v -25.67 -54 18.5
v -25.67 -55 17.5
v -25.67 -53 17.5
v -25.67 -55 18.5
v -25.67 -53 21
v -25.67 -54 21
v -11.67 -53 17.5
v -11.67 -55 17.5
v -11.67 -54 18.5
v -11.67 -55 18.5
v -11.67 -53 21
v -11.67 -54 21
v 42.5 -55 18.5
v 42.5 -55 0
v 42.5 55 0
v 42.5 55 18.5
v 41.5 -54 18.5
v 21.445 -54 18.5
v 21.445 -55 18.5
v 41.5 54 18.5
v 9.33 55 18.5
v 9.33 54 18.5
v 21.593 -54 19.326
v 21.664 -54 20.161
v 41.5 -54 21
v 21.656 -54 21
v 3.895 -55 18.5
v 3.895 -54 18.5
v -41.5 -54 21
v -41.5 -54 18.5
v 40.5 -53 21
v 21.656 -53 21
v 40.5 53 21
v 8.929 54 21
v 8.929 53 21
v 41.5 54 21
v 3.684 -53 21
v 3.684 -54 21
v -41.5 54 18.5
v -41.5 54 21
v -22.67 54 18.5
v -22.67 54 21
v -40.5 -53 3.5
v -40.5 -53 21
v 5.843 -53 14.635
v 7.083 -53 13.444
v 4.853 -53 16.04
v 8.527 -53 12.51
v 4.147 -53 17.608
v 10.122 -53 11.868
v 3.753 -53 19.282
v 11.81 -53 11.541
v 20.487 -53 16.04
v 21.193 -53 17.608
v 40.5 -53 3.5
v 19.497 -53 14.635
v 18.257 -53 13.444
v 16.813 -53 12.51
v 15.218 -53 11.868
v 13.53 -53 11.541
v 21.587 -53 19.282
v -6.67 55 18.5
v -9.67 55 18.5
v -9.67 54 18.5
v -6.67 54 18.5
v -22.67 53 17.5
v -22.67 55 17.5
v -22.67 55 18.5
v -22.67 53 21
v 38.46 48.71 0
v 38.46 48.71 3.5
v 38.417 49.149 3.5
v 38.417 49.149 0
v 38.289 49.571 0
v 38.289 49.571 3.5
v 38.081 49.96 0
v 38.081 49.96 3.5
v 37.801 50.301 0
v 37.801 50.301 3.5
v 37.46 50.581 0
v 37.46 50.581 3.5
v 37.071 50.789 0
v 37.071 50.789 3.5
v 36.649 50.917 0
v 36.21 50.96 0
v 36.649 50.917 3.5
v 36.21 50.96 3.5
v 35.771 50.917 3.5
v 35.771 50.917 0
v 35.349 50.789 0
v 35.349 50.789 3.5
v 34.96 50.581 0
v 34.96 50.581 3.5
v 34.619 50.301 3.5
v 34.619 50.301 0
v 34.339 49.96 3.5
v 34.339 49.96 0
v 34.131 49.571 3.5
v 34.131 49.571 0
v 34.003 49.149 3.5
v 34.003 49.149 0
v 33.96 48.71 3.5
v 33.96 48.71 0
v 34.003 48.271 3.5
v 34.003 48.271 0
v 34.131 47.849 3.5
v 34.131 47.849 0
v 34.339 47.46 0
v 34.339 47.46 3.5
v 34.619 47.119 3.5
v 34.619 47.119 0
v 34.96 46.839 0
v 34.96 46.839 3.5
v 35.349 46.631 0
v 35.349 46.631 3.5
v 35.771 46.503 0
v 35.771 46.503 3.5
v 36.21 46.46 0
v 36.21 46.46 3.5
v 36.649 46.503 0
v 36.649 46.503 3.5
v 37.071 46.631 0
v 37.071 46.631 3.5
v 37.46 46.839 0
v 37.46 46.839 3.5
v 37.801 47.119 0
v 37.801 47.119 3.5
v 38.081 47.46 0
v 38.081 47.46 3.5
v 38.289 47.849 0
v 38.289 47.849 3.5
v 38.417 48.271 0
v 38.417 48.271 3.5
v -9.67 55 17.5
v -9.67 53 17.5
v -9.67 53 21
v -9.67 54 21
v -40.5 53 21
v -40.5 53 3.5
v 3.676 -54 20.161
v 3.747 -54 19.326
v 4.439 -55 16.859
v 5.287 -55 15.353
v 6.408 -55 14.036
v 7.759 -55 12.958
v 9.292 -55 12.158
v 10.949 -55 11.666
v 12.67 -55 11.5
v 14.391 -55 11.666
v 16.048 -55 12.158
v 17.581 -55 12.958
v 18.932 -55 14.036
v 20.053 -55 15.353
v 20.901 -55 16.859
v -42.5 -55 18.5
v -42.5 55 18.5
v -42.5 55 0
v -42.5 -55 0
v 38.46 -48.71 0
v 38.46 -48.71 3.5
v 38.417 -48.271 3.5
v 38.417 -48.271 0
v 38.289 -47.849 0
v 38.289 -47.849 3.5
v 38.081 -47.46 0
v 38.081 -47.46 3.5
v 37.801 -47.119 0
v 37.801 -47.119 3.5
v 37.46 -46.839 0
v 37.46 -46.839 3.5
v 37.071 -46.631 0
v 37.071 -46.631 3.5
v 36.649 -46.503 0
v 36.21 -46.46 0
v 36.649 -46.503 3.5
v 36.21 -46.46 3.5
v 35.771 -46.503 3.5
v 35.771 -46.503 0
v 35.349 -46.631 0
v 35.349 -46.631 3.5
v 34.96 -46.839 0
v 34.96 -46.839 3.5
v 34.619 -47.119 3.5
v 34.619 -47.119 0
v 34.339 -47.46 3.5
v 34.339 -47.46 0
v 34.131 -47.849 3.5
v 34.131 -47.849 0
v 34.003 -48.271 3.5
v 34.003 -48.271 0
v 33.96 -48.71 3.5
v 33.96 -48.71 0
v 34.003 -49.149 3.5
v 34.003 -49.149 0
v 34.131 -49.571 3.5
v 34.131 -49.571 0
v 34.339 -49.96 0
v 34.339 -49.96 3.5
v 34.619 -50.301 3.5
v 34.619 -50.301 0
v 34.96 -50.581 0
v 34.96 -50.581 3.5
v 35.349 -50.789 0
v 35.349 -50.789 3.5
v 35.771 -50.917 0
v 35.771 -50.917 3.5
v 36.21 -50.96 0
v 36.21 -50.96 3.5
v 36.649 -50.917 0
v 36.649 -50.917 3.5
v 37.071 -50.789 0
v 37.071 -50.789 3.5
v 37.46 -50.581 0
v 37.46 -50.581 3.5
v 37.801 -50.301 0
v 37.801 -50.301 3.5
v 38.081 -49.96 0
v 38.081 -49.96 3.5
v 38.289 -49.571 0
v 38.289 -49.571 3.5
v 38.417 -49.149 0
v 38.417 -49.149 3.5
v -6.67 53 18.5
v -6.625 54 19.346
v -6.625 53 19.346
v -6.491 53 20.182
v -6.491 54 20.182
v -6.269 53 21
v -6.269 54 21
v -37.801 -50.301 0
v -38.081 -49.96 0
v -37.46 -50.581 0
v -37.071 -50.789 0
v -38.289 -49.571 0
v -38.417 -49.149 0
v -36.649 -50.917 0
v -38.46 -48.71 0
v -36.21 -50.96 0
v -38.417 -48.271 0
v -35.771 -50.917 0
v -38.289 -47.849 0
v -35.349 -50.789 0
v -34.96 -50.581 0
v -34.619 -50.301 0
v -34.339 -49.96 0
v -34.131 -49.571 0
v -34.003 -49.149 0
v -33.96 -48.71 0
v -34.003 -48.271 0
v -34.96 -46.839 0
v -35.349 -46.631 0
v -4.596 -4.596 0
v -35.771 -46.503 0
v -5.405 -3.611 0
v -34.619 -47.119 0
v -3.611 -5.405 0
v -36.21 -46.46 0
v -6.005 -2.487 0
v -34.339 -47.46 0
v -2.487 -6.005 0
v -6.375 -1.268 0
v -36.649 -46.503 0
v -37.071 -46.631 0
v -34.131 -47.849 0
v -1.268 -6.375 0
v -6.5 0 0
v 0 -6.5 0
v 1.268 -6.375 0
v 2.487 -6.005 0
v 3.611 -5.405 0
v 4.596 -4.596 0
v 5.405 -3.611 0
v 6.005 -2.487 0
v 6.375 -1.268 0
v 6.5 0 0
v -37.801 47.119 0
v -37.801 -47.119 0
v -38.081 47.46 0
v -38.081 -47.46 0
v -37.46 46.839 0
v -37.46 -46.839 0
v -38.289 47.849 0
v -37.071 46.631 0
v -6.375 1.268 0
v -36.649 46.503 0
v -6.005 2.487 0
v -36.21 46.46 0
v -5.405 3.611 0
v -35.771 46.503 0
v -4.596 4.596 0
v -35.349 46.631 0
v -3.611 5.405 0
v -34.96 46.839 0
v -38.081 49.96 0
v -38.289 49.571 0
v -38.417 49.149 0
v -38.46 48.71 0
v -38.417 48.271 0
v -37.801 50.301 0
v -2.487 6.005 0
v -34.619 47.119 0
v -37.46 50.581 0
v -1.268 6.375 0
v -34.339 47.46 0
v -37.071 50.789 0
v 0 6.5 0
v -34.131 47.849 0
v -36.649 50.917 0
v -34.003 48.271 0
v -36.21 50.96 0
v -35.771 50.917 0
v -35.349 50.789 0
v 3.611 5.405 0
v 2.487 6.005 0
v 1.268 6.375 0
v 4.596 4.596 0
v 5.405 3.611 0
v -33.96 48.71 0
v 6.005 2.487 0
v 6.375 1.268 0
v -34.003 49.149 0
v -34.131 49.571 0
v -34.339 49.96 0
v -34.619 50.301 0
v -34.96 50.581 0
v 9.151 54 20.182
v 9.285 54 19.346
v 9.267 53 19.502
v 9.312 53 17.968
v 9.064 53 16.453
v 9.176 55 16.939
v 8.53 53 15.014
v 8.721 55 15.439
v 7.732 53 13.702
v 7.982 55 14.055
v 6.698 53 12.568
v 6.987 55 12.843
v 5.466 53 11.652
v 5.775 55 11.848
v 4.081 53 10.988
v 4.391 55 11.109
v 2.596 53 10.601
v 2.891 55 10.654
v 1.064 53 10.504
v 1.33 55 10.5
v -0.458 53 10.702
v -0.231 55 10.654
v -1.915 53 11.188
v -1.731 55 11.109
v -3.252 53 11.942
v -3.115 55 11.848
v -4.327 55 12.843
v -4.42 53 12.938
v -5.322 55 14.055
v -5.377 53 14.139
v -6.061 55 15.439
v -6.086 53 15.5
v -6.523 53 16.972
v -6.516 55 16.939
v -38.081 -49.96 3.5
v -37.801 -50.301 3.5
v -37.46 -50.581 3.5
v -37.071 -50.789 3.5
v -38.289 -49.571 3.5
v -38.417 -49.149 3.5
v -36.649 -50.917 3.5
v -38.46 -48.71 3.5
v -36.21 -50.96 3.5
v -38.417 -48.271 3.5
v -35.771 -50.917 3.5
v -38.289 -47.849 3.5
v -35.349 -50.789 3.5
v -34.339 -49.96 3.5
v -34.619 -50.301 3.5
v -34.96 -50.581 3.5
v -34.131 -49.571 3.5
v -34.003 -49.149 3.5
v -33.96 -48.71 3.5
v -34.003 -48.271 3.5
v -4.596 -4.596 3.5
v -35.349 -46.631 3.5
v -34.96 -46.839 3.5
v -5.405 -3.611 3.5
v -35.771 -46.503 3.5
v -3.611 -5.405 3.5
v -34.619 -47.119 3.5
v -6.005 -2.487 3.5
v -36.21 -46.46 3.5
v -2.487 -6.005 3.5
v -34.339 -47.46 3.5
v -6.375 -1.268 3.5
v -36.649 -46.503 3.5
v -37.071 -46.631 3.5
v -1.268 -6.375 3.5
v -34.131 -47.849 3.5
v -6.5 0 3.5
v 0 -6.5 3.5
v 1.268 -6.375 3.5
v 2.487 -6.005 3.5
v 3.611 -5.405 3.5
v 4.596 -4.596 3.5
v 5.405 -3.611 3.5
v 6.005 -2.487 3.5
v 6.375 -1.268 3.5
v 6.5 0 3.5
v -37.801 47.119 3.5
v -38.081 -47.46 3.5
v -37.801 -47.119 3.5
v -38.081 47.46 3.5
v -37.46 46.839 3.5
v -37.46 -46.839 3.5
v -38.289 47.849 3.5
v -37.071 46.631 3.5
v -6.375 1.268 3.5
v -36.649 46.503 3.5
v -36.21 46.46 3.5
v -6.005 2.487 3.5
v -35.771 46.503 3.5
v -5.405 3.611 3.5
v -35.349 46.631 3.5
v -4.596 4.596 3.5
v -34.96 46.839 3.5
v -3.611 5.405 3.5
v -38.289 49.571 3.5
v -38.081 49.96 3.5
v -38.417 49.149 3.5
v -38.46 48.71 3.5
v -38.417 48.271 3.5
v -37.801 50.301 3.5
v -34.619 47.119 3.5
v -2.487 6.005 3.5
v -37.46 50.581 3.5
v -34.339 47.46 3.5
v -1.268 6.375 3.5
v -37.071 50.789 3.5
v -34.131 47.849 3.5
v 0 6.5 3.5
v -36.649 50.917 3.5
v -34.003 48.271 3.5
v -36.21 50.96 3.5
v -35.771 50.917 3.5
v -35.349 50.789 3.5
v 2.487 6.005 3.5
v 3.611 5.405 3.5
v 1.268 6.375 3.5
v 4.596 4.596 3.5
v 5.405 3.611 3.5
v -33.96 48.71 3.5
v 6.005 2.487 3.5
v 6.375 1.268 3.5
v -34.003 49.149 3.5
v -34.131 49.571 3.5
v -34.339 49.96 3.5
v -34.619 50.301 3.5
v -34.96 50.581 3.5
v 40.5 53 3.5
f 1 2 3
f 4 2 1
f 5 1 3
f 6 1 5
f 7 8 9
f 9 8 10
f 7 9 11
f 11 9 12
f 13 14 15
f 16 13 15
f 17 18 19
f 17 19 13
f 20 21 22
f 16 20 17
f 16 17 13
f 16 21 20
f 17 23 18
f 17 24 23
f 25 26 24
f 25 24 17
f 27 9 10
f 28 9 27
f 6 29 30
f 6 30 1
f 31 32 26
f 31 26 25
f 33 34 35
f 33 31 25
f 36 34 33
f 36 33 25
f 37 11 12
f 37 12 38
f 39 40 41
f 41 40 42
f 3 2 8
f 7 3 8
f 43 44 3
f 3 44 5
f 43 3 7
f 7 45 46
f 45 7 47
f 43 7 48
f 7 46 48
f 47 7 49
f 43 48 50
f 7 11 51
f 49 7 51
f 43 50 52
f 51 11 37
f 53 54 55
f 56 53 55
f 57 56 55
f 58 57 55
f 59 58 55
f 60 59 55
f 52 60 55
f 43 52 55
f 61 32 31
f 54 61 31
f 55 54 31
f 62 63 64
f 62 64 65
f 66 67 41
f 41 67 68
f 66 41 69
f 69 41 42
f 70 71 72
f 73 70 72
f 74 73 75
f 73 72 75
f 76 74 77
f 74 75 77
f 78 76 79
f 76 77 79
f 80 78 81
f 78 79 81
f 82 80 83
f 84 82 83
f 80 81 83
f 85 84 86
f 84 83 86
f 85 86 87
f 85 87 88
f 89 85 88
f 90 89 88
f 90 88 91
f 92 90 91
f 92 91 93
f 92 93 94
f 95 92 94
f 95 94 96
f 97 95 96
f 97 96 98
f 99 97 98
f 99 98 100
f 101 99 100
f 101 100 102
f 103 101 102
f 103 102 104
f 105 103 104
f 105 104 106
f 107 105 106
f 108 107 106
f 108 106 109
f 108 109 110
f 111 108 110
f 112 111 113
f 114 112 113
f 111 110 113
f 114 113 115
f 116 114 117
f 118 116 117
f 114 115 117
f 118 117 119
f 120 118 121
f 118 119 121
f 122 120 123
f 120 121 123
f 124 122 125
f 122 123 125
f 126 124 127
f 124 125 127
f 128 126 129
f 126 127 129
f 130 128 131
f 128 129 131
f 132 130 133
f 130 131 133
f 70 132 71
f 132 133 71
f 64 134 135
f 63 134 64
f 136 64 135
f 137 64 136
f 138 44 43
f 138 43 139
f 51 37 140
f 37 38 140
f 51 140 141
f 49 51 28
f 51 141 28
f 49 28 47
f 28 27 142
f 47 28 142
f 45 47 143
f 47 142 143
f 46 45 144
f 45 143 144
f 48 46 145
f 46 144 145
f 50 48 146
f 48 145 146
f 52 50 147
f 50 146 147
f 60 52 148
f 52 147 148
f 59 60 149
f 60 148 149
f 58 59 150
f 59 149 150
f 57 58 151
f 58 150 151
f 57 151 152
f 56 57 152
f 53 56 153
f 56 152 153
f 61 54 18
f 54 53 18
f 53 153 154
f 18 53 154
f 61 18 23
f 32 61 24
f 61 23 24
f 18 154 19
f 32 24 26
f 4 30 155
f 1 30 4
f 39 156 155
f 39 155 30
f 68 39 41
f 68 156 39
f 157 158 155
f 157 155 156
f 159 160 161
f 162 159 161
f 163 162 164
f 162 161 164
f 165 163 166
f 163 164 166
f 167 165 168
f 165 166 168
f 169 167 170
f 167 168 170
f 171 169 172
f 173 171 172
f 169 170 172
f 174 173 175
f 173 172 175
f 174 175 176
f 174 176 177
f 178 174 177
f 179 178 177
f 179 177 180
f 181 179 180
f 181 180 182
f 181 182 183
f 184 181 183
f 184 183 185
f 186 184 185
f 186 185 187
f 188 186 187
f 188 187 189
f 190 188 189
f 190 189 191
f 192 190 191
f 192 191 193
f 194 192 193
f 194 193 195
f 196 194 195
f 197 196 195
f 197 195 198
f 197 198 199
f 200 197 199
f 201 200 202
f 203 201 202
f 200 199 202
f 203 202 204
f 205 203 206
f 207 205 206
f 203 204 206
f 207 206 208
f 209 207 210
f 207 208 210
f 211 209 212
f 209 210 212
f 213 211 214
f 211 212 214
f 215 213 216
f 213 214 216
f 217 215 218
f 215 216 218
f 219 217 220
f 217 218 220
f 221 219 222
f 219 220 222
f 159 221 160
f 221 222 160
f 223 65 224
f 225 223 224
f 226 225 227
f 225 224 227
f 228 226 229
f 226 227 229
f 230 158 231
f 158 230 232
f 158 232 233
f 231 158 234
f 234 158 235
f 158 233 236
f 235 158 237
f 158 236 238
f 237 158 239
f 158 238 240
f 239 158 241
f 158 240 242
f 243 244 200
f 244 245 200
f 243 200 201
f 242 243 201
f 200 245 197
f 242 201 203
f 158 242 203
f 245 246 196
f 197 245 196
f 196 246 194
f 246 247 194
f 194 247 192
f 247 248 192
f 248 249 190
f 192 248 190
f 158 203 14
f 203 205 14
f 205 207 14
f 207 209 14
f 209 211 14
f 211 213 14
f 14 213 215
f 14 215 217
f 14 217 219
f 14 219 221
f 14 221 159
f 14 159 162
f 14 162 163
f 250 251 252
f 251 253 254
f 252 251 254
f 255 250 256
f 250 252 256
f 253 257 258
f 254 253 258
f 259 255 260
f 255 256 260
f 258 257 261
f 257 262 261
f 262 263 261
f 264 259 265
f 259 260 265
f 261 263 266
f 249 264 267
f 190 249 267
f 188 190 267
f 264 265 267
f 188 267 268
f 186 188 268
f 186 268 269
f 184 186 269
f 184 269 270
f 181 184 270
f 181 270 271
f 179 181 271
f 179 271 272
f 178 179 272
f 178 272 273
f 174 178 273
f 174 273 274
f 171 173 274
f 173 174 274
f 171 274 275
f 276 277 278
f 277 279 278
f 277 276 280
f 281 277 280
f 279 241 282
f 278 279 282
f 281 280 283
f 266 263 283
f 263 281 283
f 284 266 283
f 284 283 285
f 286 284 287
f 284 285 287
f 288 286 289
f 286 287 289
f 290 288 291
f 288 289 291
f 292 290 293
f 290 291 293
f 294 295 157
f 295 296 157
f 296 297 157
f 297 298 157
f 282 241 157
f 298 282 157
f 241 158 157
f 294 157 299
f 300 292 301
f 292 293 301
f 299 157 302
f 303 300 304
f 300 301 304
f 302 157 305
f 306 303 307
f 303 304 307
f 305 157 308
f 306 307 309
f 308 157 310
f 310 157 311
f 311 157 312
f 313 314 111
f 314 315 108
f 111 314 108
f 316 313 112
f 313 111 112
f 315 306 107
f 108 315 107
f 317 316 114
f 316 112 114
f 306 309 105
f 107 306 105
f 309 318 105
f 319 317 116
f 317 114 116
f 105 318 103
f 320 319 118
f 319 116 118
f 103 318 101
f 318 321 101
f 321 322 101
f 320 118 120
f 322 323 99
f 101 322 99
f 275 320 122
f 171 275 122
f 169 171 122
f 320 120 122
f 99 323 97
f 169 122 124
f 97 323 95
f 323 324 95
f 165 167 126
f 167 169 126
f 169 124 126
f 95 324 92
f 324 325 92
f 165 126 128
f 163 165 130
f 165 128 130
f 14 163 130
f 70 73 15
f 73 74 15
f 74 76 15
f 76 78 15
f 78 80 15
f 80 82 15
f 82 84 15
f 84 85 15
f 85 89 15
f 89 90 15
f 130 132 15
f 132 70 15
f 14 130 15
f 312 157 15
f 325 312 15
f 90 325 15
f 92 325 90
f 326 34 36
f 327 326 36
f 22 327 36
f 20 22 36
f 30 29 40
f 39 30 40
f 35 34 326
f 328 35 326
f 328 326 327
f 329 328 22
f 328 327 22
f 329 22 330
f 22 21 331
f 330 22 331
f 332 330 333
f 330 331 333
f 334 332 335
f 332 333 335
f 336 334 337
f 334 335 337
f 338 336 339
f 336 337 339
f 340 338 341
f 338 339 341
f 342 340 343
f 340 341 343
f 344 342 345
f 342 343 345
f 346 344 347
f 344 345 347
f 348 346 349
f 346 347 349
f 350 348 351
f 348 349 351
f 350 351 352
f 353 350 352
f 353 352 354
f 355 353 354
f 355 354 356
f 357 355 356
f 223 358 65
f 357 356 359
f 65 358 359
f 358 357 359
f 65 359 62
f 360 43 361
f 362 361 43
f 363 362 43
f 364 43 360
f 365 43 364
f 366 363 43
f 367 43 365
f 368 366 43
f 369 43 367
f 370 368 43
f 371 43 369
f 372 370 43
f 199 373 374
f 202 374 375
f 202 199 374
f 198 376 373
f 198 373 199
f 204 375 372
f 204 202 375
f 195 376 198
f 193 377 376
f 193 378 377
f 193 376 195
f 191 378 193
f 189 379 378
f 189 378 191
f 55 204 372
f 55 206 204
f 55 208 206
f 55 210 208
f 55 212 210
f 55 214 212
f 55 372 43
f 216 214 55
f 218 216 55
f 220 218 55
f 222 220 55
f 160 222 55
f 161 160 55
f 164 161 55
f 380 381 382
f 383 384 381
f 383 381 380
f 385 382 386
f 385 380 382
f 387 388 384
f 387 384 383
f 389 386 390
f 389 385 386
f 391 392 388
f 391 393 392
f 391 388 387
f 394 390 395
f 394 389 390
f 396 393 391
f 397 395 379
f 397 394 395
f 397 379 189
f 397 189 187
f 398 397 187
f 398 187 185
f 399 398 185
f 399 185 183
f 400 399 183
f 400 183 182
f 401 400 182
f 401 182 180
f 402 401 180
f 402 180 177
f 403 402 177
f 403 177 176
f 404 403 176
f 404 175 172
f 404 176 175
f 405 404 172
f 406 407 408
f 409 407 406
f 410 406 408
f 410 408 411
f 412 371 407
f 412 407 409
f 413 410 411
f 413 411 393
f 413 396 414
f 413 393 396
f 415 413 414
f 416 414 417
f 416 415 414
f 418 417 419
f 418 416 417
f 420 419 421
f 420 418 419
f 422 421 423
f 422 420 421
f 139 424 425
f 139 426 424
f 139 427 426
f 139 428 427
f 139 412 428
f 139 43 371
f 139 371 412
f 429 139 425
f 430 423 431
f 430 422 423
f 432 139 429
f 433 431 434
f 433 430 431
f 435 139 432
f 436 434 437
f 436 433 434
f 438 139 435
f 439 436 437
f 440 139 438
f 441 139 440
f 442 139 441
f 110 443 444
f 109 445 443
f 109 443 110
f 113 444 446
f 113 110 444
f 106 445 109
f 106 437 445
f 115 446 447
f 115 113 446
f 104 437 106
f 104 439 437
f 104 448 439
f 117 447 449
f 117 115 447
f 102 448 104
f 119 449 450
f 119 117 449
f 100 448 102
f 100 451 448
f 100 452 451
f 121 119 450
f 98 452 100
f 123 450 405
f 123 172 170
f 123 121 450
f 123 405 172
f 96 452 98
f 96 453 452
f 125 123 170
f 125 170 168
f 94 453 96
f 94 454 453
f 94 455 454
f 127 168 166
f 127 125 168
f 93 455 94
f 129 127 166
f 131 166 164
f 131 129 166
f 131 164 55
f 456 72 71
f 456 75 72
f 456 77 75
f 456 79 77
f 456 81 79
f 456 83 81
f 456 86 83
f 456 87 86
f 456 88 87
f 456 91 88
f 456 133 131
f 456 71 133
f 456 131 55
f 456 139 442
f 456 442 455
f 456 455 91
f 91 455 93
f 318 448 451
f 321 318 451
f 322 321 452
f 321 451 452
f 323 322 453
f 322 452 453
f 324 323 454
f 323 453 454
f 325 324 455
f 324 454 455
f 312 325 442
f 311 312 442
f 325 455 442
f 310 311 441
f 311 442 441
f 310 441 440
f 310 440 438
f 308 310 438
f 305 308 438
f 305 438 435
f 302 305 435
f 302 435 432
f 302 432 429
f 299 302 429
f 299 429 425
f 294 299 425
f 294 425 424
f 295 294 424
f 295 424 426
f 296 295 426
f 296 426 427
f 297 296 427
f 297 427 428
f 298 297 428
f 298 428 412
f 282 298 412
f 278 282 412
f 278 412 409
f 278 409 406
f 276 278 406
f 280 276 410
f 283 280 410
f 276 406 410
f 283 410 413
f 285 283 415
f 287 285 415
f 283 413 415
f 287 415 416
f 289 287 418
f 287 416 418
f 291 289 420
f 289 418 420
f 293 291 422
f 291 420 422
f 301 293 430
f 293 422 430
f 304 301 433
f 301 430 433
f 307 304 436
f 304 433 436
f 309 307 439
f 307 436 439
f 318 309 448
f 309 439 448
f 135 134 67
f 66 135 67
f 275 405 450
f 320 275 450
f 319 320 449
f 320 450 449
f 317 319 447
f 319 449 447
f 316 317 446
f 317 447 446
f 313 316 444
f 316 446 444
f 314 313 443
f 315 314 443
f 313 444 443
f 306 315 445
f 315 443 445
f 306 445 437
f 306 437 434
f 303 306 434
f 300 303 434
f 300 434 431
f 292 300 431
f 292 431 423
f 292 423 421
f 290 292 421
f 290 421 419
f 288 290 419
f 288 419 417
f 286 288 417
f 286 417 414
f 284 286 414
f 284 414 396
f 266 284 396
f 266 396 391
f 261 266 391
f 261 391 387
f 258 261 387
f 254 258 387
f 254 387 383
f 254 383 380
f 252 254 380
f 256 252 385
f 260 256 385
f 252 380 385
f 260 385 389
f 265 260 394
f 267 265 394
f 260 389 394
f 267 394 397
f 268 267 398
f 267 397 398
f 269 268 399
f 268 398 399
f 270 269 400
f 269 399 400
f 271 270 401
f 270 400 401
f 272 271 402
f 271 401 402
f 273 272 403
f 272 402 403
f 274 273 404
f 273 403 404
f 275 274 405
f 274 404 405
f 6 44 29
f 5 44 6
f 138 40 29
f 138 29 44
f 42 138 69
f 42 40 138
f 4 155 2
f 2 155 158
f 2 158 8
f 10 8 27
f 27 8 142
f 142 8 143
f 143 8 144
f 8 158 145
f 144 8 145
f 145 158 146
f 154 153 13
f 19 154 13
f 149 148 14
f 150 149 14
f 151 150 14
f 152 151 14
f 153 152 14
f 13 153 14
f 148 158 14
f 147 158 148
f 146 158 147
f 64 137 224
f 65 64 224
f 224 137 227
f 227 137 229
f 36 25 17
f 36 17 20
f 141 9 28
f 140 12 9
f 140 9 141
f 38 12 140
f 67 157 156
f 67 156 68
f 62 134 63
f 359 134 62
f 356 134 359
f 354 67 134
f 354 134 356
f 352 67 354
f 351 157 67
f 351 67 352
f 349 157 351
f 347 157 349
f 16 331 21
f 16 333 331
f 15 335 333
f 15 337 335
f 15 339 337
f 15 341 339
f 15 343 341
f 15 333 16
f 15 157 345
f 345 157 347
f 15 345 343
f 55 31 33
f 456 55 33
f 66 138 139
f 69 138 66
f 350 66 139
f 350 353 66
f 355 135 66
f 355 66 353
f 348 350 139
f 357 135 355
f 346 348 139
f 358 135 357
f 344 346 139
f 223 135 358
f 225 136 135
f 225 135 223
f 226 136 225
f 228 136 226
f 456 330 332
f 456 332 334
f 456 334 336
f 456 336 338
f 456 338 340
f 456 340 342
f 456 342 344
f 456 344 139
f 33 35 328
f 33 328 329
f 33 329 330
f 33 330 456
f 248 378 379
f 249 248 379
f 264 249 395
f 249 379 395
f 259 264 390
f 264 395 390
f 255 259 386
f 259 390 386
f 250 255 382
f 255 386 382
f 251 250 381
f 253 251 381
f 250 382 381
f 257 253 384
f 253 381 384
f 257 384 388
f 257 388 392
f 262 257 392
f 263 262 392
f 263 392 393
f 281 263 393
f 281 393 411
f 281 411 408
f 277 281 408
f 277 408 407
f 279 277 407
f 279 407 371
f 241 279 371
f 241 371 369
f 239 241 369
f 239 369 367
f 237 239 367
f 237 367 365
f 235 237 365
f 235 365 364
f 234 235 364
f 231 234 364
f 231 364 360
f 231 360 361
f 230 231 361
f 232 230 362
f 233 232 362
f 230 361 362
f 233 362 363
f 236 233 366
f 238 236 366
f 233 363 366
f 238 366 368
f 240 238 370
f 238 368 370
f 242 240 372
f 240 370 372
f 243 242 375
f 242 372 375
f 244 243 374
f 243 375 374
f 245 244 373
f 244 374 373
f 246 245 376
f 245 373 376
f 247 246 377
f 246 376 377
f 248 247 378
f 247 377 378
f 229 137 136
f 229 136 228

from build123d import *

# Parameters (mm, degrees)
SKETCH_W        = 85
SKETCH_H        = 110
PAD_DEPTH       = 3.5
SKETCH001_W     = 85
SKETCH001_H     = 110
PAD001_DEPTH    = 17.5
SKETCH002_W     = 81
SKETCH002_H     = 106
POCKET_DEPTH    = 17.5
SKETCH003_W     = 85
SKETCH003_H     = 110
SKETCH003_W_2   = 83
SKETCH003_H_2   = 108
POCKET001_DEPTH = 2.5
SKETCH004_R     = 9
SKETCH004_W     = 14
SKETCH004_H     = 12
POCKET002_DEPTH = 5
SKETCH005_R     = 8
SKETCH005_W     = 13
SKETCH005_H     = 12
POCKET003_DEPTH = 5
SKETCH006_R     = 2.25
POCKET004_DEPTH = 5
SKETCH007_R     = 6.5
POCKET005_DEPTH = 5


with BuildPart() as part:
    # Sketch → Pad (new body)
    with BuildSketch(Plane.XY):
        Rectangle(SKETCH_W, SKETCH_H)
    extrude(amount=PAD_DEPTH)

    # Sketch001 (on Face6 of Pad) → Pad001 (join)
    with BuildSketch(Plane.XY.offset(3.5)):
        Rectangle(SKETCH001_W, SKETCH001_H)
    extrude(amount=PAD001_DEPTH)

    # Sketch002 (on Face9 of Pad001) → Pocket (cut)
    with BuildSketch(Plane.XY.offset(21)):
        Rectangle(SKETCH002_W, SKETCH002_H)
    extrude(amount=-POCKET_DEPTH, mode=Mode.SUBTRACT)

    # Sketch003 (on Face9 of Pocket) → Pocket001 (cut)
    with BuildSketch(Plane.XY.offset(21)):
        Rectangle(SKETCH003_W, SKETCH003_H)
        Rectangle(SKETCH003_W_2, SKETCH003_H_2, mode=Mode.SUBTRACT)
    extrude(amount=-POCKET001_DEPTH, mode=Mode.SUBTRACT)

    # Sketch004 (on Face10 of Pocket001) → Pocket002 (cut)
    with BuildSketch(Plane.XZ.offset(55)):
        with Locations((12.67, 20.5)):
            Circle(SKETCH004_R)
        with Locations((-18.67, 23.5)):
            Rectangle(SKETCH004_W, SKETCH004_H)
    extrude(amount=-POCKET002_DEPTH, mode=Mode.SUBTRACT)

    # Sketch005 (on Face5 of Pocket002) → Pocket003 (cut)
    with BuildSketch(Plane(origin=(0, 55, 0), x_dir=(-1, 0, 0), z_dir=(0, 1, 0))):
        with Locations((-1.33, 18.5)):
            Circle(SKETCH005_R)
        with Locations((16.17, 23.5)):
            Rectangle(SKETCH005_W, SKETCH005_H)
    extrude(amount=-POCKET003_DEPTH, mode=Mode.SUBTRACT)

    # Sketch006 (on Face39 of Pocket003) → Pocket004 (cut)
    with BuildSketch(Plane.XY.offset(3.5)):
        with Locations((-36.21, 48.71)):
            Circle(SKETCH006_R)
        with Locations((36.21, 48.71)):
            Circle(SKETCH006_R)
        with Locations((-36.21, -48.71)):
            Circle(SKETCH006_R)
        with Locations((36.21, -48.71)):
            Circle(SKETCH006_R)
    extrude(amount=-POCKET004_DEPTH, mode=Mode.SUBTRACT)

    # Sketch007 (on Face21 of Pocket004) → Pocket005 (cut)
    with BuildSketch(Plane.XY.offset(3.5)):
        Circle(SKETCH007_R)
    extrude(amount=-POCKET005_DEPTH, mode=Mode.SUBTRACT)


solid = part.part
